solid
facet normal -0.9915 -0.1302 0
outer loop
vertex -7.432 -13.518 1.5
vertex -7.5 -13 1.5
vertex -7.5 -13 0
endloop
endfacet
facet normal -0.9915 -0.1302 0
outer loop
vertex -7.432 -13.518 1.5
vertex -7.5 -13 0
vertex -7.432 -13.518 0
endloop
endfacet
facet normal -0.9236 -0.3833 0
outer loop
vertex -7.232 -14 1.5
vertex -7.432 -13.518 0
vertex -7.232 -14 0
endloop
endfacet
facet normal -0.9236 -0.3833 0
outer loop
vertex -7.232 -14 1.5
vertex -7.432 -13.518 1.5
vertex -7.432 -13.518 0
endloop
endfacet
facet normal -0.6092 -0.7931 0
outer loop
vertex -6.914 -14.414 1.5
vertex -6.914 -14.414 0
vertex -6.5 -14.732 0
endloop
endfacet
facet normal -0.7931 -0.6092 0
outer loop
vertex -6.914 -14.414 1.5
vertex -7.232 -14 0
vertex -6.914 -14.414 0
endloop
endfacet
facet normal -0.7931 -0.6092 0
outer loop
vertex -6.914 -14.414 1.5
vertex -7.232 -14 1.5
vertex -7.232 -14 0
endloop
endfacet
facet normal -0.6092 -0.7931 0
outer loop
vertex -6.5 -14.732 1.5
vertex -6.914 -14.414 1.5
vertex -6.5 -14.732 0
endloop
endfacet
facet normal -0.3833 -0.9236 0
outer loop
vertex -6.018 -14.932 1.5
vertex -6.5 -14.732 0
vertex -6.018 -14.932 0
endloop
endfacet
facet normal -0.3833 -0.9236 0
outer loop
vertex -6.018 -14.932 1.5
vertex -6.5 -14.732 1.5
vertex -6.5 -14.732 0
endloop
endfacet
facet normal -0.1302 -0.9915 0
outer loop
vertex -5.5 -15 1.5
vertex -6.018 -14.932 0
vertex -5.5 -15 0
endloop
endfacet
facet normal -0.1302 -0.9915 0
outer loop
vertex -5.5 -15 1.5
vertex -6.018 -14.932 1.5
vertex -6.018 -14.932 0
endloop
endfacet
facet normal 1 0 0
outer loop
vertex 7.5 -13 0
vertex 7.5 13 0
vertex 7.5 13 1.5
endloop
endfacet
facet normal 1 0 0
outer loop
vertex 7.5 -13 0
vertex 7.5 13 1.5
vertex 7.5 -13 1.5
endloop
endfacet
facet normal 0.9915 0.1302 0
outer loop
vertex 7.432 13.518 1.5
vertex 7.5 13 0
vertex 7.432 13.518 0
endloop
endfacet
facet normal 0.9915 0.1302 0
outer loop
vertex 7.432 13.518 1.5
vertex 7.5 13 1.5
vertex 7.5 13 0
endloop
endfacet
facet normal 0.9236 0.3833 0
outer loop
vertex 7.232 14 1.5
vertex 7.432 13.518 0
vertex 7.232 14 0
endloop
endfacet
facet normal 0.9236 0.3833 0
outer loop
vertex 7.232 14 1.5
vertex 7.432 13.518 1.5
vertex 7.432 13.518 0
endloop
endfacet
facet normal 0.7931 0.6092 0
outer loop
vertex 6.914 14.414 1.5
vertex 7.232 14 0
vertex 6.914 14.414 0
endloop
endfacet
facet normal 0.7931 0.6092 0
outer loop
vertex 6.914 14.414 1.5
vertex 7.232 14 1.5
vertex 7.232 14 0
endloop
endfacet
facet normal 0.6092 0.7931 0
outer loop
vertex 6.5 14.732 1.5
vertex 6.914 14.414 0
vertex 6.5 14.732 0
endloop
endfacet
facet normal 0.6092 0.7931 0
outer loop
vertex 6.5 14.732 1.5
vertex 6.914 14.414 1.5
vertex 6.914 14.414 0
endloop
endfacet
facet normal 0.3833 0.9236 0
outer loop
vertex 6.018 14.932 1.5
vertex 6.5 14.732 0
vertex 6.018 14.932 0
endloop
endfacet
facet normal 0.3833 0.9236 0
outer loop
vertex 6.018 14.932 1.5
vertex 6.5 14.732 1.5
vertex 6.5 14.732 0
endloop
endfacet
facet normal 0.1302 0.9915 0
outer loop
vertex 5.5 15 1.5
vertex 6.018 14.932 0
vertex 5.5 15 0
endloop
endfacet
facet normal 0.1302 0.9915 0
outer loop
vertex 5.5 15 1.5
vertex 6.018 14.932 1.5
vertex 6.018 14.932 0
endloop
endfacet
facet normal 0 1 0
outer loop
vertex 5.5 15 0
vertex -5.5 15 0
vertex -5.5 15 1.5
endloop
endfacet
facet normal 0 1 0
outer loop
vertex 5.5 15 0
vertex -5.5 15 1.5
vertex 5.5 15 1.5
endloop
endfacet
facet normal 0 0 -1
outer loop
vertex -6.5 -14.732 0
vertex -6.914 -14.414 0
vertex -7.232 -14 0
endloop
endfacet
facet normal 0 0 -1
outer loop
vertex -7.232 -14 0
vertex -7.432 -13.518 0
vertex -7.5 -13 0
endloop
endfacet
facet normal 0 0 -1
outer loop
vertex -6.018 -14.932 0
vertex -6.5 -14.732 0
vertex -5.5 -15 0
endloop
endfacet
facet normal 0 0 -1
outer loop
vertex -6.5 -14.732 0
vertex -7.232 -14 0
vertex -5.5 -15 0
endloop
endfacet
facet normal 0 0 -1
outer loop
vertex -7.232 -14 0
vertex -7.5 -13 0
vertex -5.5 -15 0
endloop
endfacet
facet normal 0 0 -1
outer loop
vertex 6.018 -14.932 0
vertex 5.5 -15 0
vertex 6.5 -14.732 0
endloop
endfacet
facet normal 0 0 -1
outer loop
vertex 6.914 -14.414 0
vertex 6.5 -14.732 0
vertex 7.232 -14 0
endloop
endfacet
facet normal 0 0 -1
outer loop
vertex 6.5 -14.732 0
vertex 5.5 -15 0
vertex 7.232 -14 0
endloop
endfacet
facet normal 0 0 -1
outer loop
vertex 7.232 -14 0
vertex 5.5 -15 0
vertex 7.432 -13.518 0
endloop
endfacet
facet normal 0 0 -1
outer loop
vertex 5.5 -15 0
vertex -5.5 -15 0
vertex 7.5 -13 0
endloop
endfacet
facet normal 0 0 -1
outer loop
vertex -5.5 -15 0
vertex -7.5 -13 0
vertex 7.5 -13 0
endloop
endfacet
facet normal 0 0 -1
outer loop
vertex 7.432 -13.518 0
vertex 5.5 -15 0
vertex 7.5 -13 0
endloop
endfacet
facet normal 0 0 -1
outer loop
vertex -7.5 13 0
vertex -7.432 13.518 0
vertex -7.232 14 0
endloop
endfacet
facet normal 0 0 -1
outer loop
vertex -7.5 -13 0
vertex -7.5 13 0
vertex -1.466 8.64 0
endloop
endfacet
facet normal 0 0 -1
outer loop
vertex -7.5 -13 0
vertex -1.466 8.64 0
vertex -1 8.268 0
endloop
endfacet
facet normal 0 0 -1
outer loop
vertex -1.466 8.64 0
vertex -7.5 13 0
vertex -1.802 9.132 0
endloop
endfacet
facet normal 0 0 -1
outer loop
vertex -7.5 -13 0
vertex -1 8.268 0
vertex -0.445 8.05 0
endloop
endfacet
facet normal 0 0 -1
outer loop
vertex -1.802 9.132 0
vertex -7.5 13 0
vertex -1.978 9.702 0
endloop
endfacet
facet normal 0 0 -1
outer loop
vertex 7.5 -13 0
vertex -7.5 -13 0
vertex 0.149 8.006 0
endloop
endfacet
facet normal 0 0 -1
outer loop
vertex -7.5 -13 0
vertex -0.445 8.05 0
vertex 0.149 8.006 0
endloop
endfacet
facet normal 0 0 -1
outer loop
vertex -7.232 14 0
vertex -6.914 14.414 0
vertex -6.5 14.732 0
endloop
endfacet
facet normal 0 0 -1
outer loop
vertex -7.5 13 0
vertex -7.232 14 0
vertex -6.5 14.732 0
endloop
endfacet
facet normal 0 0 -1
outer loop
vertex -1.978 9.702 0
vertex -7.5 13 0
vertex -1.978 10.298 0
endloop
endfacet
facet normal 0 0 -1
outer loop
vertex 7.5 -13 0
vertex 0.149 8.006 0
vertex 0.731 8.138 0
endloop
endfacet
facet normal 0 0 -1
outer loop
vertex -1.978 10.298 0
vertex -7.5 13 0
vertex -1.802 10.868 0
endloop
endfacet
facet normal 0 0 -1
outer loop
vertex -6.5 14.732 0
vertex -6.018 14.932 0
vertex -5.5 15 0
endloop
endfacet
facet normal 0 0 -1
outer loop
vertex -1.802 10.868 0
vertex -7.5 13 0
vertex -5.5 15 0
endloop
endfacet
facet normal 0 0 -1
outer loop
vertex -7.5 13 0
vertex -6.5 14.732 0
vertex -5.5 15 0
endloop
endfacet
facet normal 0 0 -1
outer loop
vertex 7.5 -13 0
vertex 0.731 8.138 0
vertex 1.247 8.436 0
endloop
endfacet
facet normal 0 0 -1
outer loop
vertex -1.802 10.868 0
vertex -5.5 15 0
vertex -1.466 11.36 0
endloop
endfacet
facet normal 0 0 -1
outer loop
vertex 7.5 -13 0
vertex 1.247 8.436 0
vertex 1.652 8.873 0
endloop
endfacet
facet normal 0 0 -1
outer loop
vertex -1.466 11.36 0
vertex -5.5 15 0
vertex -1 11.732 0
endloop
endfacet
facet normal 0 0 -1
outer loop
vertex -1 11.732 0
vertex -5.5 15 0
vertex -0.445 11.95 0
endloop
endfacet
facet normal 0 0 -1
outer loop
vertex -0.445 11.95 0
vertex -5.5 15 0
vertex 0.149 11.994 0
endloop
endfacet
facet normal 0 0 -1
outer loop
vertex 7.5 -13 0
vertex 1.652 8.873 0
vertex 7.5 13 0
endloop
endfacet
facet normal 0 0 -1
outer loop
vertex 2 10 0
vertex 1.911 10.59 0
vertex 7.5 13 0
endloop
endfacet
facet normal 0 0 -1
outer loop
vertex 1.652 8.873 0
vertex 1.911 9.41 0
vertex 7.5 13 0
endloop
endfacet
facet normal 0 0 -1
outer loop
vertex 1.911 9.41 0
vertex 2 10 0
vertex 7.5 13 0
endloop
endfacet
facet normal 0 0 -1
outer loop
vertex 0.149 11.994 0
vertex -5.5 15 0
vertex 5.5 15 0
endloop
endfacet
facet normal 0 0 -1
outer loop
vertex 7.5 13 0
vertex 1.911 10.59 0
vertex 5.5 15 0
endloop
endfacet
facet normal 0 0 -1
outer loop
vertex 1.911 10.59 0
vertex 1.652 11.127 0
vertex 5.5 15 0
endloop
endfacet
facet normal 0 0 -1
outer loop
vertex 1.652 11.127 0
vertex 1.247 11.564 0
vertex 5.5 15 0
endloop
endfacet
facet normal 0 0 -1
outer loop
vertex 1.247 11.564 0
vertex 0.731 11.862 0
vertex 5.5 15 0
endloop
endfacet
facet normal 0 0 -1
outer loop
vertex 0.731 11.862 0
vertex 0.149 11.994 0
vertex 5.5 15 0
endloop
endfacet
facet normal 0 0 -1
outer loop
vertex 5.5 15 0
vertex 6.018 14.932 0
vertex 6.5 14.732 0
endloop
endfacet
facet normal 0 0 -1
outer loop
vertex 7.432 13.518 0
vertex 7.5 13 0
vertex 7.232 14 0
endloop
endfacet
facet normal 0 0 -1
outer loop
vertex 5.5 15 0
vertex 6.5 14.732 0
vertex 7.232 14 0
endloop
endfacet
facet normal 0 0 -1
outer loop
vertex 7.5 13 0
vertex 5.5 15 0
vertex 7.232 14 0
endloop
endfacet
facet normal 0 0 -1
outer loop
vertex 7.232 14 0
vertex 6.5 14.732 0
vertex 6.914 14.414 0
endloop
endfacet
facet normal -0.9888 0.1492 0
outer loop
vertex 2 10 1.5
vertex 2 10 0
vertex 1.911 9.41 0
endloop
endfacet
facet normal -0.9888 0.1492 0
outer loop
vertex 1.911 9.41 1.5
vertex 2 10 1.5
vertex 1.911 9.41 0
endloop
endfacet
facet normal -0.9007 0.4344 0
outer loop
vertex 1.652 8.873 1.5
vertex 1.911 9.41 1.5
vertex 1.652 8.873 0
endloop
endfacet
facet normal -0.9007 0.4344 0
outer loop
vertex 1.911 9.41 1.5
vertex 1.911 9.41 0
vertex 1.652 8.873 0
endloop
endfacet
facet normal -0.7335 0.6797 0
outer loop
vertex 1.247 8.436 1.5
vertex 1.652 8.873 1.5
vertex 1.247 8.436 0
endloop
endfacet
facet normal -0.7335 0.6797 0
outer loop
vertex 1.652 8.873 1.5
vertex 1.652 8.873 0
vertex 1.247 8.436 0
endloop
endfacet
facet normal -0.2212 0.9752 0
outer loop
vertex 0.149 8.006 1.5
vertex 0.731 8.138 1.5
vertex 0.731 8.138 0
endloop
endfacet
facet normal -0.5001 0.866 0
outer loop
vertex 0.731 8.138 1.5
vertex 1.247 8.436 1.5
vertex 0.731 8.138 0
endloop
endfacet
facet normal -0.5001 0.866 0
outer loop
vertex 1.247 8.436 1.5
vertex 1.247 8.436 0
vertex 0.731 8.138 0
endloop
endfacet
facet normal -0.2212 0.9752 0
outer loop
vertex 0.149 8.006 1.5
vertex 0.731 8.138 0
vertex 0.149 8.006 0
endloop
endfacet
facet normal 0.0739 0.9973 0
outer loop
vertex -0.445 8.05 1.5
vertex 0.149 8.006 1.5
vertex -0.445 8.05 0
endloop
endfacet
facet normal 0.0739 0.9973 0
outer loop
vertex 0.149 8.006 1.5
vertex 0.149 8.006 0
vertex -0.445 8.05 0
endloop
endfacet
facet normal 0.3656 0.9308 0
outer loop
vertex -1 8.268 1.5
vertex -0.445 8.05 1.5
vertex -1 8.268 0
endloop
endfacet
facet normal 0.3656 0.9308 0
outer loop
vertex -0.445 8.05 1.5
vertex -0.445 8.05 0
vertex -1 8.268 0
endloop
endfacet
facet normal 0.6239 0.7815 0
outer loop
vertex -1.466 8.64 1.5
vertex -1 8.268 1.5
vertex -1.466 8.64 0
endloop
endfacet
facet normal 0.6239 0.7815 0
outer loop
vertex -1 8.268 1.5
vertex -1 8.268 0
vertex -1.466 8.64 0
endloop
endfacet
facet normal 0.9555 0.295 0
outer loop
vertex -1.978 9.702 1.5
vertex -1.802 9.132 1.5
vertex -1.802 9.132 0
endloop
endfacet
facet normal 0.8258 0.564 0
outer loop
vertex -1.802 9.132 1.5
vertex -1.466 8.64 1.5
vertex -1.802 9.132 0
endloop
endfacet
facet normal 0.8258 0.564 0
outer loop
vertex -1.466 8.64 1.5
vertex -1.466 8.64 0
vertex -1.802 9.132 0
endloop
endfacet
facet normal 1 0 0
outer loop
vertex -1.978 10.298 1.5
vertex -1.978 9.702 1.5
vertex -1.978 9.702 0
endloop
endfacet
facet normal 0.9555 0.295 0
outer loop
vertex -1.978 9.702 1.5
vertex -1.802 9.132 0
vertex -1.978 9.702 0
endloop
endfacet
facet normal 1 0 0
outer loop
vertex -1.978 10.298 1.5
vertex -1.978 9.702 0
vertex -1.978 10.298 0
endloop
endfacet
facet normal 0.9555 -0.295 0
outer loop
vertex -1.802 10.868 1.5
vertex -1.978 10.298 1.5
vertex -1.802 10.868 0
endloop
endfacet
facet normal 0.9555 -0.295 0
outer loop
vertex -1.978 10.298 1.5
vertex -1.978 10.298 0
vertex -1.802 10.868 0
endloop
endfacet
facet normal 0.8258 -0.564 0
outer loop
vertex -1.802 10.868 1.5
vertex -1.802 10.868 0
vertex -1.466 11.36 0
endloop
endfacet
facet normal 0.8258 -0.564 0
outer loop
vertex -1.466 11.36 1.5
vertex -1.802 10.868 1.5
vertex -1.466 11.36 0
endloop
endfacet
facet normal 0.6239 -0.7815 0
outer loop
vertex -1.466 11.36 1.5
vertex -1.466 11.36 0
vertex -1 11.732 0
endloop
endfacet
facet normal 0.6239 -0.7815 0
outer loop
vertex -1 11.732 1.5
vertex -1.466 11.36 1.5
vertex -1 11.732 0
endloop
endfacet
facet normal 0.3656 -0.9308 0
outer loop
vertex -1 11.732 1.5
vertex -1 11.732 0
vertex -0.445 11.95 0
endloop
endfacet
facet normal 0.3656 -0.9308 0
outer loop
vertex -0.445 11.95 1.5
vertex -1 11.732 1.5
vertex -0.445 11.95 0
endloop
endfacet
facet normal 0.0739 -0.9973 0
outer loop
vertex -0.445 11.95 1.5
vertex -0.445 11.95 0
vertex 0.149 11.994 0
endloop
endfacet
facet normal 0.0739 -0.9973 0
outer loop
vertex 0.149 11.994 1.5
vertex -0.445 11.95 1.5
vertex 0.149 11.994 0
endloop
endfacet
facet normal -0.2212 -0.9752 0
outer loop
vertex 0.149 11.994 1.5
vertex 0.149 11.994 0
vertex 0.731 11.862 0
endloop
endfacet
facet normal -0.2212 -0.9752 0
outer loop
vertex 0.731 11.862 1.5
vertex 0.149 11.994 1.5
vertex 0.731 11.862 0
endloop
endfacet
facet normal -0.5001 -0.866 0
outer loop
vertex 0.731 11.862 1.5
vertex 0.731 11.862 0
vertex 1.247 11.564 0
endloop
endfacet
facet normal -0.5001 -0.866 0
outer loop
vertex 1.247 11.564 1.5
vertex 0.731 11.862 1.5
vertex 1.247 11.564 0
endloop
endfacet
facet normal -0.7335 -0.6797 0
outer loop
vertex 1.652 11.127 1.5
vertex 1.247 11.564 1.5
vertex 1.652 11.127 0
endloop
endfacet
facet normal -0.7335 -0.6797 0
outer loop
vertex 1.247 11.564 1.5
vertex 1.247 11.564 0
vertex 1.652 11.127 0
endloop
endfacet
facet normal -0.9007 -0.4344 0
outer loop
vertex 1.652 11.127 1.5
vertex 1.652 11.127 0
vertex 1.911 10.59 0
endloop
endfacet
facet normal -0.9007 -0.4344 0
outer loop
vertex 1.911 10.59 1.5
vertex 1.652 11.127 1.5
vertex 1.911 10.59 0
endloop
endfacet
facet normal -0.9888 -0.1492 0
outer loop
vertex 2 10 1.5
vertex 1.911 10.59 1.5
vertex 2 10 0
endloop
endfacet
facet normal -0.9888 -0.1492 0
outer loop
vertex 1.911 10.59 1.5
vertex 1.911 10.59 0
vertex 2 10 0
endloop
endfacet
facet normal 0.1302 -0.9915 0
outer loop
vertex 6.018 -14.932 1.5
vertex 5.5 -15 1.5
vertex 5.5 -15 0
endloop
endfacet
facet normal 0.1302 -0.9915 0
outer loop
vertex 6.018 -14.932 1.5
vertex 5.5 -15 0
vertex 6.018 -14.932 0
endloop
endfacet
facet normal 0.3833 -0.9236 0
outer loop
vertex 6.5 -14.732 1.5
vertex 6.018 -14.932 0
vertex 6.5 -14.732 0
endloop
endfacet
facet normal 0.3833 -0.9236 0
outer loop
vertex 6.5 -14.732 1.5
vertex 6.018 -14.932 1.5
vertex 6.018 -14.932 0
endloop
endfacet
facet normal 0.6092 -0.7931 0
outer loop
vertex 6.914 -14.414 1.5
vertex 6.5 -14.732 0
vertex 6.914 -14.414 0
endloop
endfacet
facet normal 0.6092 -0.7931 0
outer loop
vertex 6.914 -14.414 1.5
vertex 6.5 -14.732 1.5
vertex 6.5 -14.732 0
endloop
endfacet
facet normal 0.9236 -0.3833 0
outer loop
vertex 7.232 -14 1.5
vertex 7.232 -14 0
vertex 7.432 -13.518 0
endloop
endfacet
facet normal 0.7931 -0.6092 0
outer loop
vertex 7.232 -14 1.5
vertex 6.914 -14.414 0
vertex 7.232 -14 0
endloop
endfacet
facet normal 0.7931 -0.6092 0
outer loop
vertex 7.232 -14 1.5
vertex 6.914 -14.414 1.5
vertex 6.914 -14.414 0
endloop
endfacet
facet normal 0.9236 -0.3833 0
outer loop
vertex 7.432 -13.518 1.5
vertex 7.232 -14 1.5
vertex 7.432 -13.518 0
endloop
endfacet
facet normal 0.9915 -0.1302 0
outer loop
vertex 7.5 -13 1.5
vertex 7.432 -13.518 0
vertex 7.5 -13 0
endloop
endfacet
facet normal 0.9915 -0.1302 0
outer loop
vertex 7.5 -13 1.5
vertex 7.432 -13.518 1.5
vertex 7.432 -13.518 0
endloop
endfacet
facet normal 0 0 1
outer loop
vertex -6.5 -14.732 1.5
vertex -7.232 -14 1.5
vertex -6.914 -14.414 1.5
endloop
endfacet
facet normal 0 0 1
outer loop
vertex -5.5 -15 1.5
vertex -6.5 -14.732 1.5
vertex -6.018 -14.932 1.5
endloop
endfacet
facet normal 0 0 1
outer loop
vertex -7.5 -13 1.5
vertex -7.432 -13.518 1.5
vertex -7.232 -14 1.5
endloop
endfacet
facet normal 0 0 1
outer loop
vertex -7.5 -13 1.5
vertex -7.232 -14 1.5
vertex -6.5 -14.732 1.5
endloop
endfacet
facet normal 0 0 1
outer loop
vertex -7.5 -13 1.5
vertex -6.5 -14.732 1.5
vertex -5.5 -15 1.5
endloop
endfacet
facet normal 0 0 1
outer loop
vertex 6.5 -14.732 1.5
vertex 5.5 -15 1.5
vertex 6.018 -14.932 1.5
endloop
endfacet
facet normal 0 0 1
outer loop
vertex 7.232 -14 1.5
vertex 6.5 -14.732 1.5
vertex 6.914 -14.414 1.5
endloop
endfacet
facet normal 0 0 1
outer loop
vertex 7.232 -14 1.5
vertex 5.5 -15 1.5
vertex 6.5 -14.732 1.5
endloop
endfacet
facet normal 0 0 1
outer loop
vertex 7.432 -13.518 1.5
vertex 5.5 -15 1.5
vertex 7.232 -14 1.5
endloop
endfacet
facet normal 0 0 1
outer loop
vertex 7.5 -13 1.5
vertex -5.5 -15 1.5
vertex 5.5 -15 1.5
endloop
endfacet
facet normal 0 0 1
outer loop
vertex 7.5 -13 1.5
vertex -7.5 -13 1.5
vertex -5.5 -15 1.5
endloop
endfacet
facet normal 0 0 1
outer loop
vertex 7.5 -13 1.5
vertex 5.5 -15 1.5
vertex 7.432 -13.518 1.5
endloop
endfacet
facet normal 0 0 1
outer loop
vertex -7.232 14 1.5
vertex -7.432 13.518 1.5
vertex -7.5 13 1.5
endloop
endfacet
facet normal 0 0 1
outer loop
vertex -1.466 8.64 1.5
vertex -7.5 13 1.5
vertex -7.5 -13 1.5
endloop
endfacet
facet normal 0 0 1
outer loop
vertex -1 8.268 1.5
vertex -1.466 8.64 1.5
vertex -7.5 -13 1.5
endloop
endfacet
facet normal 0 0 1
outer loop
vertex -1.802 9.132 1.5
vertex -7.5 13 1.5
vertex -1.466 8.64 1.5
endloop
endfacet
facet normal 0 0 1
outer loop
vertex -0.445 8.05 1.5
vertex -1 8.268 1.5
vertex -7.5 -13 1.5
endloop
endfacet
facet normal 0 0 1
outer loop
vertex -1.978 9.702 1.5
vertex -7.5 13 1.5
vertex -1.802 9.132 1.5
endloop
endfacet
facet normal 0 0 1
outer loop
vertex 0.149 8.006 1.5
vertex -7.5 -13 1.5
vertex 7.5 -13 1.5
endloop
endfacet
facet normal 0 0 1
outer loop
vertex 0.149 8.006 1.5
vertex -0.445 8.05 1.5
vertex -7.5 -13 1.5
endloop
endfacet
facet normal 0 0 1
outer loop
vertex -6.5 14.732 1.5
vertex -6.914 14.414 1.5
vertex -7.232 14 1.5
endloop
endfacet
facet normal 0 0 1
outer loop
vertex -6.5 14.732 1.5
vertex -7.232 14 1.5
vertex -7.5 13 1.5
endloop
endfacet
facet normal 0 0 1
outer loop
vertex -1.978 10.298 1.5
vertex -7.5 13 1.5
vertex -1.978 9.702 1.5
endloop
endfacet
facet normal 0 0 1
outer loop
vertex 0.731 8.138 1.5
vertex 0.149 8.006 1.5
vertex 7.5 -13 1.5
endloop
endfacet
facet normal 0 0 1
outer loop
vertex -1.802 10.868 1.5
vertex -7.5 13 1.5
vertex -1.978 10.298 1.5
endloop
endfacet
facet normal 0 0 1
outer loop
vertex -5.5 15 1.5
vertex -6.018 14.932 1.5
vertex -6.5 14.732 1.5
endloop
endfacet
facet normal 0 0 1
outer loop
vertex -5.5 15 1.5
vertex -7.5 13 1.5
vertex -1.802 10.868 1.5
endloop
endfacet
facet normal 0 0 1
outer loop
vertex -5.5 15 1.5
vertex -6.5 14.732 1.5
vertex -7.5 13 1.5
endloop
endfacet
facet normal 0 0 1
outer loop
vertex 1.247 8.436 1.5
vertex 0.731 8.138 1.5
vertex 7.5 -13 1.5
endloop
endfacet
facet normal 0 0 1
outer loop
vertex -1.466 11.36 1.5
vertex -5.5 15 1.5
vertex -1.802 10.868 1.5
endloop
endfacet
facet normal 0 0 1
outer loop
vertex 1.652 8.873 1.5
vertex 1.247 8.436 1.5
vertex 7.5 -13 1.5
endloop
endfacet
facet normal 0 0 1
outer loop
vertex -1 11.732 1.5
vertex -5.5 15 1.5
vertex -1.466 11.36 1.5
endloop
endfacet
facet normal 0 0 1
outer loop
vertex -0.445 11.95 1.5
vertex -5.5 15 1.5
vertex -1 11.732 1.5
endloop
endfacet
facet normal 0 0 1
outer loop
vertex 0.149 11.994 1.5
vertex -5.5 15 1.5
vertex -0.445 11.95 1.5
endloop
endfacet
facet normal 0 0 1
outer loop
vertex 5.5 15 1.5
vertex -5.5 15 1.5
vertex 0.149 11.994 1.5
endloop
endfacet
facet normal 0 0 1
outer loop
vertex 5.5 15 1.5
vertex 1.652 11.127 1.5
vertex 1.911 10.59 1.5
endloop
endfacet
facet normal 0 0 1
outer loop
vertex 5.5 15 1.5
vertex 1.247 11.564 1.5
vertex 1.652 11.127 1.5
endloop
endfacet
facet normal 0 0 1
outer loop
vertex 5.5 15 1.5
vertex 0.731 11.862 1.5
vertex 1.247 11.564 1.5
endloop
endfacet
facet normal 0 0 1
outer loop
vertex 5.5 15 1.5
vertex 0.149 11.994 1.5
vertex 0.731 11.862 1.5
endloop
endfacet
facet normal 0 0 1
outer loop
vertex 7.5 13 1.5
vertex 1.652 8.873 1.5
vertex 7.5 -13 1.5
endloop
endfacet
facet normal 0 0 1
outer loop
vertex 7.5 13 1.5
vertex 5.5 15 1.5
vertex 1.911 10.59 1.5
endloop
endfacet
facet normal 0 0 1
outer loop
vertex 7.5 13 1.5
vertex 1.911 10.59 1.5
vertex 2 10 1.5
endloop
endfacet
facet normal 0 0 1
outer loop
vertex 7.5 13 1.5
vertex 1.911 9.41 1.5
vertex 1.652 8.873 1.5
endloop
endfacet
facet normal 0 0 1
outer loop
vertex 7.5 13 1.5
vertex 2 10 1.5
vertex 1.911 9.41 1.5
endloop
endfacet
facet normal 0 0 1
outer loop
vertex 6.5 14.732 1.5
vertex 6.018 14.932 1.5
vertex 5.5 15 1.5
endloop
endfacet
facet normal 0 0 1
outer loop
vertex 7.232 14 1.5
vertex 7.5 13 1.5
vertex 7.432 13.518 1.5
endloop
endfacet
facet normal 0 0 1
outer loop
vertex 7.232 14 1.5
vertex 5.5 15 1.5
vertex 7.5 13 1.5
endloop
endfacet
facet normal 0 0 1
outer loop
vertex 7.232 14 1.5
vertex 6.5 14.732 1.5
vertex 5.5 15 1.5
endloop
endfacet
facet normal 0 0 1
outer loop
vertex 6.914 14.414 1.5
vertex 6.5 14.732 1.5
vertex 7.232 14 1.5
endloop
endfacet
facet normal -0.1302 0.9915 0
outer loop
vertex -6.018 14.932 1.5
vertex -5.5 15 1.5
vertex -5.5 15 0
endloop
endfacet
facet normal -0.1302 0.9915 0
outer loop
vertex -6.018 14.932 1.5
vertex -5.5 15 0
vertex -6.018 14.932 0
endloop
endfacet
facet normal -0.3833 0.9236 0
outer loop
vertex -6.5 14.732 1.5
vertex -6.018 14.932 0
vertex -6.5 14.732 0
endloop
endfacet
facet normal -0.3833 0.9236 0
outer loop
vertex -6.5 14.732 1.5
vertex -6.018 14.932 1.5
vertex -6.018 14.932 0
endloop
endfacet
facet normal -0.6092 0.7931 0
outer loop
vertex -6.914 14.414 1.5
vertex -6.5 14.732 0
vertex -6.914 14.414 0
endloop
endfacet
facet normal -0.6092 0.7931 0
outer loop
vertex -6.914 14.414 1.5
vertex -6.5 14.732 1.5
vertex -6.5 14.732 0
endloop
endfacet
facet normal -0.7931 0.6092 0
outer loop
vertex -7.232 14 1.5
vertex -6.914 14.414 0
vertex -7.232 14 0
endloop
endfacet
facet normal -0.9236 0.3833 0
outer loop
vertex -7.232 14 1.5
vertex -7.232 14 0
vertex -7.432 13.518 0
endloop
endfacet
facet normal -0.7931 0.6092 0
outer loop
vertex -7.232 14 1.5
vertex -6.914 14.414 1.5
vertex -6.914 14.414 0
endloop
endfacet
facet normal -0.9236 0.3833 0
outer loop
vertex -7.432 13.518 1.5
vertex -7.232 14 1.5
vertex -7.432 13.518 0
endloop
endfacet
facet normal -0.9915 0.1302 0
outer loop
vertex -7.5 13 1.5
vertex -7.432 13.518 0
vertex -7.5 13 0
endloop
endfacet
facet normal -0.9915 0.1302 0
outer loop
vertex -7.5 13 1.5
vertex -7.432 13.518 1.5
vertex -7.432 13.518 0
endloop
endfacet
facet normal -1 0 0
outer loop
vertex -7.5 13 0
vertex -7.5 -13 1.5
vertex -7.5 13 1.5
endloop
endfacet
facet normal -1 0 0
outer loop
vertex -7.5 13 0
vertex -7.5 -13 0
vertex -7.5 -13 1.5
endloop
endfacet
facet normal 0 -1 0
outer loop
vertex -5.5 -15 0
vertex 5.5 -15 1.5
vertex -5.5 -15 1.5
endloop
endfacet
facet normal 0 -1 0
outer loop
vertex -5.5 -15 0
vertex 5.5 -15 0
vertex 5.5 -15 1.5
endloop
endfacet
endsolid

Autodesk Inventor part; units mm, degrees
ref_plane "YZ Plane" through (0, 0, 0) normal (1, 0, 0) x (0, 1, 0)
ref_plane "XZ Plane" through (0, 0, 0) normal (0, 1, 0) x (-1, 0, 0)
ref_plane "XY Plane" through (0, 0, 0) normal (0, 0, 1) x (1, 0, 0)
sketch "Sketch1" plane through (0, 0, 0) normal (0, 0, 1) x (1, 0, 0)
  line L0 (-7.5, 15) -> (7.5, 15)
  line L1 (7.5, 15) -> (7.5, -15)
  line L2 (7.5, -15) -> (-7.5, -15)
  line L3 (-7.5, -15) -> (-7.5, 15)
  circle A0 centre (0, 10) radius 2
  point P0 (0, 0)
  point P1 (-7.5, 0)
  point P2 (0, 15)
  dimension "d0" = 30
  dimension "d1" = 15
  dimension "d5" = 4
  dimension "d7" = 10
extrude "Extrusion1" add sketch "Sketch1" along normal blind 1.5
fillet "Fillet1" radius 2 4 edges at (-7.5, 15, 0.75) (7.5, 15, 0.75) (-7.5, -15, 0.75) (7.5, -15, 0.75)
properties material "Rubber"
